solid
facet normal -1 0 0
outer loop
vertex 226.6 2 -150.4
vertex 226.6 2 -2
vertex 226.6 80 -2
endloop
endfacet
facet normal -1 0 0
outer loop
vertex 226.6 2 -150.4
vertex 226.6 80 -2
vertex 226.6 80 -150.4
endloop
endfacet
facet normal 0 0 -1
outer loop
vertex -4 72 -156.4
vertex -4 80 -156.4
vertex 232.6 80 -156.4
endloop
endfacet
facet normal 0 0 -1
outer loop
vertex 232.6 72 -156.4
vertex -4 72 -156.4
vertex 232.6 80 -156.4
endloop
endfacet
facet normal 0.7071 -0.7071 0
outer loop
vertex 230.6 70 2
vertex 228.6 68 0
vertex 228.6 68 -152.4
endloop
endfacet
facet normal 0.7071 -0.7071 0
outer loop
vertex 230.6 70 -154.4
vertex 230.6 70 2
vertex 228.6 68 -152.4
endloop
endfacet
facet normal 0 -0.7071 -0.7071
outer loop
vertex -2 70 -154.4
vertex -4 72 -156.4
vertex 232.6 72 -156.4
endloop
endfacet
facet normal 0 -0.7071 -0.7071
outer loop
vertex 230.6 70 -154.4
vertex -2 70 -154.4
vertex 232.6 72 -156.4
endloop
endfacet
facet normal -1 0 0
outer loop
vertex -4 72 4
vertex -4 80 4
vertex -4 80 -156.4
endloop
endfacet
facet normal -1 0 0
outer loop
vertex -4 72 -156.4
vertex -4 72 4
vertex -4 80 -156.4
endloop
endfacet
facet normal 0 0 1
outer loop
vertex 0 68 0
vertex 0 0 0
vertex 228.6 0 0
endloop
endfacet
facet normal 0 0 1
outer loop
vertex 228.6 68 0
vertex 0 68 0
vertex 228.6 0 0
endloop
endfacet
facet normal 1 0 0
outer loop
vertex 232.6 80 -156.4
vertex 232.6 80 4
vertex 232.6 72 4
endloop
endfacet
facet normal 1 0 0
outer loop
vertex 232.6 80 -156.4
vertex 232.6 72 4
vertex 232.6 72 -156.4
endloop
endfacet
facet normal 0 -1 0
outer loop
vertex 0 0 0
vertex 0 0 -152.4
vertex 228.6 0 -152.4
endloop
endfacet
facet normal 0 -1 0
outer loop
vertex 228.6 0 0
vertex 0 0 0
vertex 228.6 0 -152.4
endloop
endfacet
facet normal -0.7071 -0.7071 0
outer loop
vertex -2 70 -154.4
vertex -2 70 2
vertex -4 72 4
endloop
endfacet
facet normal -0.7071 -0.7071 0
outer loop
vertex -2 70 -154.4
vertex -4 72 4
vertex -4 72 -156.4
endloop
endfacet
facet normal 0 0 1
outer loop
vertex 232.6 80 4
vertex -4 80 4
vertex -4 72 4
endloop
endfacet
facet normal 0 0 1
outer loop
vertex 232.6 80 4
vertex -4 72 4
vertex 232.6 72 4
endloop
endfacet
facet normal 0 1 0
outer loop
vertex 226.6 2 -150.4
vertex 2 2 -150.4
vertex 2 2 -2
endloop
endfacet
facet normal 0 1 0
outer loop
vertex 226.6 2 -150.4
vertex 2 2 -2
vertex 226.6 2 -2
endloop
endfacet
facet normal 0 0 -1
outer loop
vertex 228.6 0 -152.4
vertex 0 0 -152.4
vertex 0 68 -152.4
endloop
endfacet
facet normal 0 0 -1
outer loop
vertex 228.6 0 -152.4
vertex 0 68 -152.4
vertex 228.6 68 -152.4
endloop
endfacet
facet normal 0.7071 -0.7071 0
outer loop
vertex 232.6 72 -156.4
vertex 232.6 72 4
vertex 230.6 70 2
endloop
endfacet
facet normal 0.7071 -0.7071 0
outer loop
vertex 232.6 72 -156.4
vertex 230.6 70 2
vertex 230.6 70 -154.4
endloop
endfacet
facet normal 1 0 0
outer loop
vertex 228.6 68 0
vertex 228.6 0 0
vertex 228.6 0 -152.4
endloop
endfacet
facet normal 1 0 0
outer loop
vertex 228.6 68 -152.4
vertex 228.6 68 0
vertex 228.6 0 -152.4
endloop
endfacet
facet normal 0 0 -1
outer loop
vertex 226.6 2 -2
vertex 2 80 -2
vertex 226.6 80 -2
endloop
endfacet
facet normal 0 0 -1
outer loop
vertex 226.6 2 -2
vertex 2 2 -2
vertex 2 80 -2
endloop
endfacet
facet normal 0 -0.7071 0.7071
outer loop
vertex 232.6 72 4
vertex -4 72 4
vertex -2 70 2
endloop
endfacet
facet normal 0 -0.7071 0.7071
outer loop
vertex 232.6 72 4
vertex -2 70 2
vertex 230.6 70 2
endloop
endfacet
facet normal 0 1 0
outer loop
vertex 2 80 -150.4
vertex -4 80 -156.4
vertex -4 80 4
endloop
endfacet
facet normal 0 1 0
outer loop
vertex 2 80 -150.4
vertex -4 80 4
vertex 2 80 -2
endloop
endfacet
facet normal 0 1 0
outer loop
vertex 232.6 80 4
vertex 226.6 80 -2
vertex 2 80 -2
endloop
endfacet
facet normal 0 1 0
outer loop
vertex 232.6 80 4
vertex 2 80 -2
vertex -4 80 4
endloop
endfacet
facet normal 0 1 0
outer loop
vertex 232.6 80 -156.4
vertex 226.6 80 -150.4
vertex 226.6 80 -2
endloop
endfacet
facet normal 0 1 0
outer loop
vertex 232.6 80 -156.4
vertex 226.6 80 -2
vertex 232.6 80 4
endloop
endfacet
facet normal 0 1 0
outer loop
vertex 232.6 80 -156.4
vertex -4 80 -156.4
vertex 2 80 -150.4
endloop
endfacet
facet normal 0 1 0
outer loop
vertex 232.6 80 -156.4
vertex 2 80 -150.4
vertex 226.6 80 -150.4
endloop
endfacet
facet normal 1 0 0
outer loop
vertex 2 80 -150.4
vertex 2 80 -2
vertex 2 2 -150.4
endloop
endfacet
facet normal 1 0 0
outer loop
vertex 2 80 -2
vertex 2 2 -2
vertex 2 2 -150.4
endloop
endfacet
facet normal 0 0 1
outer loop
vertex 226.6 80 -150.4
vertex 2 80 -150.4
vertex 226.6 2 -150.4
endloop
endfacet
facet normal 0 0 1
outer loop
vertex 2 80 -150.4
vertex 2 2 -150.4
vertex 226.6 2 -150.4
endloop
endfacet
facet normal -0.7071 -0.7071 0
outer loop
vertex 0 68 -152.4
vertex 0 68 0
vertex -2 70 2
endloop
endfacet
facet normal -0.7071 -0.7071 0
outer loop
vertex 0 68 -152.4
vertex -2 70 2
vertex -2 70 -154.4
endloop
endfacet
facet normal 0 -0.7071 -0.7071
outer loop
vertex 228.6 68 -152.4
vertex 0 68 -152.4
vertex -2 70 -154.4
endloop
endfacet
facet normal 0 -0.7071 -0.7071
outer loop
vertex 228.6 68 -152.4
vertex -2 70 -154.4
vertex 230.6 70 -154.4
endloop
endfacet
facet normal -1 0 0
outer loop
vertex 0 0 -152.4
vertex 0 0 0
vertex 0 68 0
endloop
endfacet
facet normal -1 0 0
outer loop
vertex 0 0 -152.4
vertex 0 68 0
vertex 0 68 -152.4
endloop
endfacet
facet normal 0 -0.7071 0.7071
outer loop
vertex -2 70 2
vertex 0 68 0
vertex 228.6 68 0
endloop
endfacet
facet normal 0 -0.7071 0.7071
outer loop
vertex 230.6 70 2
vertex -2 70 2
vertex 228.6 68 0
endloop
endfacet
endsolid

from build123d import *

# Parameters (mm, degrees)
SKETCH1_W           = 228.6
SKETCH1_H           = 152.4
BOSS_EXTRUDE1_DEPTH = 80
SHELL1_T            = -2
SKETCH2_W           = 236.6
SKETCH2_H           = 160.4
SKETCH2_W_2         = 224.6
SKETCH2_H_2         = 148.4
BOSS_EXTRUDE2_DEPTH = 10
CHAMFER1_SIZE       = 2


with BuildPart() as part:
    # Sketch1 → Boss-Extrude1 (new body)
    with BuildSketch(Plane(origin=(0, 0, 0), x_dir=(1, 0, 0), z_dir=(0, 1, 0))):
        with Locations((114.3, 76.2)):
            Rectangle(SKETCH1_W, SKETCH1_H)
    extrude(amount=BOSS_EXTRUDE1_DEPTH)

    # Shell1
    shell1_openings = [part.faces().sort_by_distance(p)[0] for p in [
        (114.3, 80, -76.2),
    ]]
    offset(amount=SHELL1_T, openings=shell1_openings, kind=Kind.INTERSECTION)

    # Sketch2 → Boss-Extrude2 (add)
    with BuildSketch(Plane(origin=(0, 80, 0), x_dir=(1, 0, 0), z_dir=(0, 1, 0))):
        with Locations((114.3, 76.2)):
            Rectangle(SKETCH2_W, SKETCH2_H)
        with Locations((114.3, 76.2)):
            Rectangle(SKETCH2_W_2, SKETCH2_H_2, mode=Mode.SUBTRACT)
    extrude(amount=-BOSS_EXTRUDE2_DEPTH)

    # Chamfer1
    chamfer1_edges = [part.edges().sort_by_distance(p)[0] for p in [
        (114.3, 70, -152.4),
        (0, 70, -76.2),
        (114.3, 70, 0),
        (228.6, 70, -76.2),
        (114.3, 70, 4),
        (-4, 70, -76.2),
        (114.3, 70, -156.4),
        (232.6, 70, -76.2),
    ]]
    chamfer(chamfer1_edges, length=CHAMFER1_SIZE - 0.0001)  # a hair under: the kernel refuses the full size


solid = part.part
